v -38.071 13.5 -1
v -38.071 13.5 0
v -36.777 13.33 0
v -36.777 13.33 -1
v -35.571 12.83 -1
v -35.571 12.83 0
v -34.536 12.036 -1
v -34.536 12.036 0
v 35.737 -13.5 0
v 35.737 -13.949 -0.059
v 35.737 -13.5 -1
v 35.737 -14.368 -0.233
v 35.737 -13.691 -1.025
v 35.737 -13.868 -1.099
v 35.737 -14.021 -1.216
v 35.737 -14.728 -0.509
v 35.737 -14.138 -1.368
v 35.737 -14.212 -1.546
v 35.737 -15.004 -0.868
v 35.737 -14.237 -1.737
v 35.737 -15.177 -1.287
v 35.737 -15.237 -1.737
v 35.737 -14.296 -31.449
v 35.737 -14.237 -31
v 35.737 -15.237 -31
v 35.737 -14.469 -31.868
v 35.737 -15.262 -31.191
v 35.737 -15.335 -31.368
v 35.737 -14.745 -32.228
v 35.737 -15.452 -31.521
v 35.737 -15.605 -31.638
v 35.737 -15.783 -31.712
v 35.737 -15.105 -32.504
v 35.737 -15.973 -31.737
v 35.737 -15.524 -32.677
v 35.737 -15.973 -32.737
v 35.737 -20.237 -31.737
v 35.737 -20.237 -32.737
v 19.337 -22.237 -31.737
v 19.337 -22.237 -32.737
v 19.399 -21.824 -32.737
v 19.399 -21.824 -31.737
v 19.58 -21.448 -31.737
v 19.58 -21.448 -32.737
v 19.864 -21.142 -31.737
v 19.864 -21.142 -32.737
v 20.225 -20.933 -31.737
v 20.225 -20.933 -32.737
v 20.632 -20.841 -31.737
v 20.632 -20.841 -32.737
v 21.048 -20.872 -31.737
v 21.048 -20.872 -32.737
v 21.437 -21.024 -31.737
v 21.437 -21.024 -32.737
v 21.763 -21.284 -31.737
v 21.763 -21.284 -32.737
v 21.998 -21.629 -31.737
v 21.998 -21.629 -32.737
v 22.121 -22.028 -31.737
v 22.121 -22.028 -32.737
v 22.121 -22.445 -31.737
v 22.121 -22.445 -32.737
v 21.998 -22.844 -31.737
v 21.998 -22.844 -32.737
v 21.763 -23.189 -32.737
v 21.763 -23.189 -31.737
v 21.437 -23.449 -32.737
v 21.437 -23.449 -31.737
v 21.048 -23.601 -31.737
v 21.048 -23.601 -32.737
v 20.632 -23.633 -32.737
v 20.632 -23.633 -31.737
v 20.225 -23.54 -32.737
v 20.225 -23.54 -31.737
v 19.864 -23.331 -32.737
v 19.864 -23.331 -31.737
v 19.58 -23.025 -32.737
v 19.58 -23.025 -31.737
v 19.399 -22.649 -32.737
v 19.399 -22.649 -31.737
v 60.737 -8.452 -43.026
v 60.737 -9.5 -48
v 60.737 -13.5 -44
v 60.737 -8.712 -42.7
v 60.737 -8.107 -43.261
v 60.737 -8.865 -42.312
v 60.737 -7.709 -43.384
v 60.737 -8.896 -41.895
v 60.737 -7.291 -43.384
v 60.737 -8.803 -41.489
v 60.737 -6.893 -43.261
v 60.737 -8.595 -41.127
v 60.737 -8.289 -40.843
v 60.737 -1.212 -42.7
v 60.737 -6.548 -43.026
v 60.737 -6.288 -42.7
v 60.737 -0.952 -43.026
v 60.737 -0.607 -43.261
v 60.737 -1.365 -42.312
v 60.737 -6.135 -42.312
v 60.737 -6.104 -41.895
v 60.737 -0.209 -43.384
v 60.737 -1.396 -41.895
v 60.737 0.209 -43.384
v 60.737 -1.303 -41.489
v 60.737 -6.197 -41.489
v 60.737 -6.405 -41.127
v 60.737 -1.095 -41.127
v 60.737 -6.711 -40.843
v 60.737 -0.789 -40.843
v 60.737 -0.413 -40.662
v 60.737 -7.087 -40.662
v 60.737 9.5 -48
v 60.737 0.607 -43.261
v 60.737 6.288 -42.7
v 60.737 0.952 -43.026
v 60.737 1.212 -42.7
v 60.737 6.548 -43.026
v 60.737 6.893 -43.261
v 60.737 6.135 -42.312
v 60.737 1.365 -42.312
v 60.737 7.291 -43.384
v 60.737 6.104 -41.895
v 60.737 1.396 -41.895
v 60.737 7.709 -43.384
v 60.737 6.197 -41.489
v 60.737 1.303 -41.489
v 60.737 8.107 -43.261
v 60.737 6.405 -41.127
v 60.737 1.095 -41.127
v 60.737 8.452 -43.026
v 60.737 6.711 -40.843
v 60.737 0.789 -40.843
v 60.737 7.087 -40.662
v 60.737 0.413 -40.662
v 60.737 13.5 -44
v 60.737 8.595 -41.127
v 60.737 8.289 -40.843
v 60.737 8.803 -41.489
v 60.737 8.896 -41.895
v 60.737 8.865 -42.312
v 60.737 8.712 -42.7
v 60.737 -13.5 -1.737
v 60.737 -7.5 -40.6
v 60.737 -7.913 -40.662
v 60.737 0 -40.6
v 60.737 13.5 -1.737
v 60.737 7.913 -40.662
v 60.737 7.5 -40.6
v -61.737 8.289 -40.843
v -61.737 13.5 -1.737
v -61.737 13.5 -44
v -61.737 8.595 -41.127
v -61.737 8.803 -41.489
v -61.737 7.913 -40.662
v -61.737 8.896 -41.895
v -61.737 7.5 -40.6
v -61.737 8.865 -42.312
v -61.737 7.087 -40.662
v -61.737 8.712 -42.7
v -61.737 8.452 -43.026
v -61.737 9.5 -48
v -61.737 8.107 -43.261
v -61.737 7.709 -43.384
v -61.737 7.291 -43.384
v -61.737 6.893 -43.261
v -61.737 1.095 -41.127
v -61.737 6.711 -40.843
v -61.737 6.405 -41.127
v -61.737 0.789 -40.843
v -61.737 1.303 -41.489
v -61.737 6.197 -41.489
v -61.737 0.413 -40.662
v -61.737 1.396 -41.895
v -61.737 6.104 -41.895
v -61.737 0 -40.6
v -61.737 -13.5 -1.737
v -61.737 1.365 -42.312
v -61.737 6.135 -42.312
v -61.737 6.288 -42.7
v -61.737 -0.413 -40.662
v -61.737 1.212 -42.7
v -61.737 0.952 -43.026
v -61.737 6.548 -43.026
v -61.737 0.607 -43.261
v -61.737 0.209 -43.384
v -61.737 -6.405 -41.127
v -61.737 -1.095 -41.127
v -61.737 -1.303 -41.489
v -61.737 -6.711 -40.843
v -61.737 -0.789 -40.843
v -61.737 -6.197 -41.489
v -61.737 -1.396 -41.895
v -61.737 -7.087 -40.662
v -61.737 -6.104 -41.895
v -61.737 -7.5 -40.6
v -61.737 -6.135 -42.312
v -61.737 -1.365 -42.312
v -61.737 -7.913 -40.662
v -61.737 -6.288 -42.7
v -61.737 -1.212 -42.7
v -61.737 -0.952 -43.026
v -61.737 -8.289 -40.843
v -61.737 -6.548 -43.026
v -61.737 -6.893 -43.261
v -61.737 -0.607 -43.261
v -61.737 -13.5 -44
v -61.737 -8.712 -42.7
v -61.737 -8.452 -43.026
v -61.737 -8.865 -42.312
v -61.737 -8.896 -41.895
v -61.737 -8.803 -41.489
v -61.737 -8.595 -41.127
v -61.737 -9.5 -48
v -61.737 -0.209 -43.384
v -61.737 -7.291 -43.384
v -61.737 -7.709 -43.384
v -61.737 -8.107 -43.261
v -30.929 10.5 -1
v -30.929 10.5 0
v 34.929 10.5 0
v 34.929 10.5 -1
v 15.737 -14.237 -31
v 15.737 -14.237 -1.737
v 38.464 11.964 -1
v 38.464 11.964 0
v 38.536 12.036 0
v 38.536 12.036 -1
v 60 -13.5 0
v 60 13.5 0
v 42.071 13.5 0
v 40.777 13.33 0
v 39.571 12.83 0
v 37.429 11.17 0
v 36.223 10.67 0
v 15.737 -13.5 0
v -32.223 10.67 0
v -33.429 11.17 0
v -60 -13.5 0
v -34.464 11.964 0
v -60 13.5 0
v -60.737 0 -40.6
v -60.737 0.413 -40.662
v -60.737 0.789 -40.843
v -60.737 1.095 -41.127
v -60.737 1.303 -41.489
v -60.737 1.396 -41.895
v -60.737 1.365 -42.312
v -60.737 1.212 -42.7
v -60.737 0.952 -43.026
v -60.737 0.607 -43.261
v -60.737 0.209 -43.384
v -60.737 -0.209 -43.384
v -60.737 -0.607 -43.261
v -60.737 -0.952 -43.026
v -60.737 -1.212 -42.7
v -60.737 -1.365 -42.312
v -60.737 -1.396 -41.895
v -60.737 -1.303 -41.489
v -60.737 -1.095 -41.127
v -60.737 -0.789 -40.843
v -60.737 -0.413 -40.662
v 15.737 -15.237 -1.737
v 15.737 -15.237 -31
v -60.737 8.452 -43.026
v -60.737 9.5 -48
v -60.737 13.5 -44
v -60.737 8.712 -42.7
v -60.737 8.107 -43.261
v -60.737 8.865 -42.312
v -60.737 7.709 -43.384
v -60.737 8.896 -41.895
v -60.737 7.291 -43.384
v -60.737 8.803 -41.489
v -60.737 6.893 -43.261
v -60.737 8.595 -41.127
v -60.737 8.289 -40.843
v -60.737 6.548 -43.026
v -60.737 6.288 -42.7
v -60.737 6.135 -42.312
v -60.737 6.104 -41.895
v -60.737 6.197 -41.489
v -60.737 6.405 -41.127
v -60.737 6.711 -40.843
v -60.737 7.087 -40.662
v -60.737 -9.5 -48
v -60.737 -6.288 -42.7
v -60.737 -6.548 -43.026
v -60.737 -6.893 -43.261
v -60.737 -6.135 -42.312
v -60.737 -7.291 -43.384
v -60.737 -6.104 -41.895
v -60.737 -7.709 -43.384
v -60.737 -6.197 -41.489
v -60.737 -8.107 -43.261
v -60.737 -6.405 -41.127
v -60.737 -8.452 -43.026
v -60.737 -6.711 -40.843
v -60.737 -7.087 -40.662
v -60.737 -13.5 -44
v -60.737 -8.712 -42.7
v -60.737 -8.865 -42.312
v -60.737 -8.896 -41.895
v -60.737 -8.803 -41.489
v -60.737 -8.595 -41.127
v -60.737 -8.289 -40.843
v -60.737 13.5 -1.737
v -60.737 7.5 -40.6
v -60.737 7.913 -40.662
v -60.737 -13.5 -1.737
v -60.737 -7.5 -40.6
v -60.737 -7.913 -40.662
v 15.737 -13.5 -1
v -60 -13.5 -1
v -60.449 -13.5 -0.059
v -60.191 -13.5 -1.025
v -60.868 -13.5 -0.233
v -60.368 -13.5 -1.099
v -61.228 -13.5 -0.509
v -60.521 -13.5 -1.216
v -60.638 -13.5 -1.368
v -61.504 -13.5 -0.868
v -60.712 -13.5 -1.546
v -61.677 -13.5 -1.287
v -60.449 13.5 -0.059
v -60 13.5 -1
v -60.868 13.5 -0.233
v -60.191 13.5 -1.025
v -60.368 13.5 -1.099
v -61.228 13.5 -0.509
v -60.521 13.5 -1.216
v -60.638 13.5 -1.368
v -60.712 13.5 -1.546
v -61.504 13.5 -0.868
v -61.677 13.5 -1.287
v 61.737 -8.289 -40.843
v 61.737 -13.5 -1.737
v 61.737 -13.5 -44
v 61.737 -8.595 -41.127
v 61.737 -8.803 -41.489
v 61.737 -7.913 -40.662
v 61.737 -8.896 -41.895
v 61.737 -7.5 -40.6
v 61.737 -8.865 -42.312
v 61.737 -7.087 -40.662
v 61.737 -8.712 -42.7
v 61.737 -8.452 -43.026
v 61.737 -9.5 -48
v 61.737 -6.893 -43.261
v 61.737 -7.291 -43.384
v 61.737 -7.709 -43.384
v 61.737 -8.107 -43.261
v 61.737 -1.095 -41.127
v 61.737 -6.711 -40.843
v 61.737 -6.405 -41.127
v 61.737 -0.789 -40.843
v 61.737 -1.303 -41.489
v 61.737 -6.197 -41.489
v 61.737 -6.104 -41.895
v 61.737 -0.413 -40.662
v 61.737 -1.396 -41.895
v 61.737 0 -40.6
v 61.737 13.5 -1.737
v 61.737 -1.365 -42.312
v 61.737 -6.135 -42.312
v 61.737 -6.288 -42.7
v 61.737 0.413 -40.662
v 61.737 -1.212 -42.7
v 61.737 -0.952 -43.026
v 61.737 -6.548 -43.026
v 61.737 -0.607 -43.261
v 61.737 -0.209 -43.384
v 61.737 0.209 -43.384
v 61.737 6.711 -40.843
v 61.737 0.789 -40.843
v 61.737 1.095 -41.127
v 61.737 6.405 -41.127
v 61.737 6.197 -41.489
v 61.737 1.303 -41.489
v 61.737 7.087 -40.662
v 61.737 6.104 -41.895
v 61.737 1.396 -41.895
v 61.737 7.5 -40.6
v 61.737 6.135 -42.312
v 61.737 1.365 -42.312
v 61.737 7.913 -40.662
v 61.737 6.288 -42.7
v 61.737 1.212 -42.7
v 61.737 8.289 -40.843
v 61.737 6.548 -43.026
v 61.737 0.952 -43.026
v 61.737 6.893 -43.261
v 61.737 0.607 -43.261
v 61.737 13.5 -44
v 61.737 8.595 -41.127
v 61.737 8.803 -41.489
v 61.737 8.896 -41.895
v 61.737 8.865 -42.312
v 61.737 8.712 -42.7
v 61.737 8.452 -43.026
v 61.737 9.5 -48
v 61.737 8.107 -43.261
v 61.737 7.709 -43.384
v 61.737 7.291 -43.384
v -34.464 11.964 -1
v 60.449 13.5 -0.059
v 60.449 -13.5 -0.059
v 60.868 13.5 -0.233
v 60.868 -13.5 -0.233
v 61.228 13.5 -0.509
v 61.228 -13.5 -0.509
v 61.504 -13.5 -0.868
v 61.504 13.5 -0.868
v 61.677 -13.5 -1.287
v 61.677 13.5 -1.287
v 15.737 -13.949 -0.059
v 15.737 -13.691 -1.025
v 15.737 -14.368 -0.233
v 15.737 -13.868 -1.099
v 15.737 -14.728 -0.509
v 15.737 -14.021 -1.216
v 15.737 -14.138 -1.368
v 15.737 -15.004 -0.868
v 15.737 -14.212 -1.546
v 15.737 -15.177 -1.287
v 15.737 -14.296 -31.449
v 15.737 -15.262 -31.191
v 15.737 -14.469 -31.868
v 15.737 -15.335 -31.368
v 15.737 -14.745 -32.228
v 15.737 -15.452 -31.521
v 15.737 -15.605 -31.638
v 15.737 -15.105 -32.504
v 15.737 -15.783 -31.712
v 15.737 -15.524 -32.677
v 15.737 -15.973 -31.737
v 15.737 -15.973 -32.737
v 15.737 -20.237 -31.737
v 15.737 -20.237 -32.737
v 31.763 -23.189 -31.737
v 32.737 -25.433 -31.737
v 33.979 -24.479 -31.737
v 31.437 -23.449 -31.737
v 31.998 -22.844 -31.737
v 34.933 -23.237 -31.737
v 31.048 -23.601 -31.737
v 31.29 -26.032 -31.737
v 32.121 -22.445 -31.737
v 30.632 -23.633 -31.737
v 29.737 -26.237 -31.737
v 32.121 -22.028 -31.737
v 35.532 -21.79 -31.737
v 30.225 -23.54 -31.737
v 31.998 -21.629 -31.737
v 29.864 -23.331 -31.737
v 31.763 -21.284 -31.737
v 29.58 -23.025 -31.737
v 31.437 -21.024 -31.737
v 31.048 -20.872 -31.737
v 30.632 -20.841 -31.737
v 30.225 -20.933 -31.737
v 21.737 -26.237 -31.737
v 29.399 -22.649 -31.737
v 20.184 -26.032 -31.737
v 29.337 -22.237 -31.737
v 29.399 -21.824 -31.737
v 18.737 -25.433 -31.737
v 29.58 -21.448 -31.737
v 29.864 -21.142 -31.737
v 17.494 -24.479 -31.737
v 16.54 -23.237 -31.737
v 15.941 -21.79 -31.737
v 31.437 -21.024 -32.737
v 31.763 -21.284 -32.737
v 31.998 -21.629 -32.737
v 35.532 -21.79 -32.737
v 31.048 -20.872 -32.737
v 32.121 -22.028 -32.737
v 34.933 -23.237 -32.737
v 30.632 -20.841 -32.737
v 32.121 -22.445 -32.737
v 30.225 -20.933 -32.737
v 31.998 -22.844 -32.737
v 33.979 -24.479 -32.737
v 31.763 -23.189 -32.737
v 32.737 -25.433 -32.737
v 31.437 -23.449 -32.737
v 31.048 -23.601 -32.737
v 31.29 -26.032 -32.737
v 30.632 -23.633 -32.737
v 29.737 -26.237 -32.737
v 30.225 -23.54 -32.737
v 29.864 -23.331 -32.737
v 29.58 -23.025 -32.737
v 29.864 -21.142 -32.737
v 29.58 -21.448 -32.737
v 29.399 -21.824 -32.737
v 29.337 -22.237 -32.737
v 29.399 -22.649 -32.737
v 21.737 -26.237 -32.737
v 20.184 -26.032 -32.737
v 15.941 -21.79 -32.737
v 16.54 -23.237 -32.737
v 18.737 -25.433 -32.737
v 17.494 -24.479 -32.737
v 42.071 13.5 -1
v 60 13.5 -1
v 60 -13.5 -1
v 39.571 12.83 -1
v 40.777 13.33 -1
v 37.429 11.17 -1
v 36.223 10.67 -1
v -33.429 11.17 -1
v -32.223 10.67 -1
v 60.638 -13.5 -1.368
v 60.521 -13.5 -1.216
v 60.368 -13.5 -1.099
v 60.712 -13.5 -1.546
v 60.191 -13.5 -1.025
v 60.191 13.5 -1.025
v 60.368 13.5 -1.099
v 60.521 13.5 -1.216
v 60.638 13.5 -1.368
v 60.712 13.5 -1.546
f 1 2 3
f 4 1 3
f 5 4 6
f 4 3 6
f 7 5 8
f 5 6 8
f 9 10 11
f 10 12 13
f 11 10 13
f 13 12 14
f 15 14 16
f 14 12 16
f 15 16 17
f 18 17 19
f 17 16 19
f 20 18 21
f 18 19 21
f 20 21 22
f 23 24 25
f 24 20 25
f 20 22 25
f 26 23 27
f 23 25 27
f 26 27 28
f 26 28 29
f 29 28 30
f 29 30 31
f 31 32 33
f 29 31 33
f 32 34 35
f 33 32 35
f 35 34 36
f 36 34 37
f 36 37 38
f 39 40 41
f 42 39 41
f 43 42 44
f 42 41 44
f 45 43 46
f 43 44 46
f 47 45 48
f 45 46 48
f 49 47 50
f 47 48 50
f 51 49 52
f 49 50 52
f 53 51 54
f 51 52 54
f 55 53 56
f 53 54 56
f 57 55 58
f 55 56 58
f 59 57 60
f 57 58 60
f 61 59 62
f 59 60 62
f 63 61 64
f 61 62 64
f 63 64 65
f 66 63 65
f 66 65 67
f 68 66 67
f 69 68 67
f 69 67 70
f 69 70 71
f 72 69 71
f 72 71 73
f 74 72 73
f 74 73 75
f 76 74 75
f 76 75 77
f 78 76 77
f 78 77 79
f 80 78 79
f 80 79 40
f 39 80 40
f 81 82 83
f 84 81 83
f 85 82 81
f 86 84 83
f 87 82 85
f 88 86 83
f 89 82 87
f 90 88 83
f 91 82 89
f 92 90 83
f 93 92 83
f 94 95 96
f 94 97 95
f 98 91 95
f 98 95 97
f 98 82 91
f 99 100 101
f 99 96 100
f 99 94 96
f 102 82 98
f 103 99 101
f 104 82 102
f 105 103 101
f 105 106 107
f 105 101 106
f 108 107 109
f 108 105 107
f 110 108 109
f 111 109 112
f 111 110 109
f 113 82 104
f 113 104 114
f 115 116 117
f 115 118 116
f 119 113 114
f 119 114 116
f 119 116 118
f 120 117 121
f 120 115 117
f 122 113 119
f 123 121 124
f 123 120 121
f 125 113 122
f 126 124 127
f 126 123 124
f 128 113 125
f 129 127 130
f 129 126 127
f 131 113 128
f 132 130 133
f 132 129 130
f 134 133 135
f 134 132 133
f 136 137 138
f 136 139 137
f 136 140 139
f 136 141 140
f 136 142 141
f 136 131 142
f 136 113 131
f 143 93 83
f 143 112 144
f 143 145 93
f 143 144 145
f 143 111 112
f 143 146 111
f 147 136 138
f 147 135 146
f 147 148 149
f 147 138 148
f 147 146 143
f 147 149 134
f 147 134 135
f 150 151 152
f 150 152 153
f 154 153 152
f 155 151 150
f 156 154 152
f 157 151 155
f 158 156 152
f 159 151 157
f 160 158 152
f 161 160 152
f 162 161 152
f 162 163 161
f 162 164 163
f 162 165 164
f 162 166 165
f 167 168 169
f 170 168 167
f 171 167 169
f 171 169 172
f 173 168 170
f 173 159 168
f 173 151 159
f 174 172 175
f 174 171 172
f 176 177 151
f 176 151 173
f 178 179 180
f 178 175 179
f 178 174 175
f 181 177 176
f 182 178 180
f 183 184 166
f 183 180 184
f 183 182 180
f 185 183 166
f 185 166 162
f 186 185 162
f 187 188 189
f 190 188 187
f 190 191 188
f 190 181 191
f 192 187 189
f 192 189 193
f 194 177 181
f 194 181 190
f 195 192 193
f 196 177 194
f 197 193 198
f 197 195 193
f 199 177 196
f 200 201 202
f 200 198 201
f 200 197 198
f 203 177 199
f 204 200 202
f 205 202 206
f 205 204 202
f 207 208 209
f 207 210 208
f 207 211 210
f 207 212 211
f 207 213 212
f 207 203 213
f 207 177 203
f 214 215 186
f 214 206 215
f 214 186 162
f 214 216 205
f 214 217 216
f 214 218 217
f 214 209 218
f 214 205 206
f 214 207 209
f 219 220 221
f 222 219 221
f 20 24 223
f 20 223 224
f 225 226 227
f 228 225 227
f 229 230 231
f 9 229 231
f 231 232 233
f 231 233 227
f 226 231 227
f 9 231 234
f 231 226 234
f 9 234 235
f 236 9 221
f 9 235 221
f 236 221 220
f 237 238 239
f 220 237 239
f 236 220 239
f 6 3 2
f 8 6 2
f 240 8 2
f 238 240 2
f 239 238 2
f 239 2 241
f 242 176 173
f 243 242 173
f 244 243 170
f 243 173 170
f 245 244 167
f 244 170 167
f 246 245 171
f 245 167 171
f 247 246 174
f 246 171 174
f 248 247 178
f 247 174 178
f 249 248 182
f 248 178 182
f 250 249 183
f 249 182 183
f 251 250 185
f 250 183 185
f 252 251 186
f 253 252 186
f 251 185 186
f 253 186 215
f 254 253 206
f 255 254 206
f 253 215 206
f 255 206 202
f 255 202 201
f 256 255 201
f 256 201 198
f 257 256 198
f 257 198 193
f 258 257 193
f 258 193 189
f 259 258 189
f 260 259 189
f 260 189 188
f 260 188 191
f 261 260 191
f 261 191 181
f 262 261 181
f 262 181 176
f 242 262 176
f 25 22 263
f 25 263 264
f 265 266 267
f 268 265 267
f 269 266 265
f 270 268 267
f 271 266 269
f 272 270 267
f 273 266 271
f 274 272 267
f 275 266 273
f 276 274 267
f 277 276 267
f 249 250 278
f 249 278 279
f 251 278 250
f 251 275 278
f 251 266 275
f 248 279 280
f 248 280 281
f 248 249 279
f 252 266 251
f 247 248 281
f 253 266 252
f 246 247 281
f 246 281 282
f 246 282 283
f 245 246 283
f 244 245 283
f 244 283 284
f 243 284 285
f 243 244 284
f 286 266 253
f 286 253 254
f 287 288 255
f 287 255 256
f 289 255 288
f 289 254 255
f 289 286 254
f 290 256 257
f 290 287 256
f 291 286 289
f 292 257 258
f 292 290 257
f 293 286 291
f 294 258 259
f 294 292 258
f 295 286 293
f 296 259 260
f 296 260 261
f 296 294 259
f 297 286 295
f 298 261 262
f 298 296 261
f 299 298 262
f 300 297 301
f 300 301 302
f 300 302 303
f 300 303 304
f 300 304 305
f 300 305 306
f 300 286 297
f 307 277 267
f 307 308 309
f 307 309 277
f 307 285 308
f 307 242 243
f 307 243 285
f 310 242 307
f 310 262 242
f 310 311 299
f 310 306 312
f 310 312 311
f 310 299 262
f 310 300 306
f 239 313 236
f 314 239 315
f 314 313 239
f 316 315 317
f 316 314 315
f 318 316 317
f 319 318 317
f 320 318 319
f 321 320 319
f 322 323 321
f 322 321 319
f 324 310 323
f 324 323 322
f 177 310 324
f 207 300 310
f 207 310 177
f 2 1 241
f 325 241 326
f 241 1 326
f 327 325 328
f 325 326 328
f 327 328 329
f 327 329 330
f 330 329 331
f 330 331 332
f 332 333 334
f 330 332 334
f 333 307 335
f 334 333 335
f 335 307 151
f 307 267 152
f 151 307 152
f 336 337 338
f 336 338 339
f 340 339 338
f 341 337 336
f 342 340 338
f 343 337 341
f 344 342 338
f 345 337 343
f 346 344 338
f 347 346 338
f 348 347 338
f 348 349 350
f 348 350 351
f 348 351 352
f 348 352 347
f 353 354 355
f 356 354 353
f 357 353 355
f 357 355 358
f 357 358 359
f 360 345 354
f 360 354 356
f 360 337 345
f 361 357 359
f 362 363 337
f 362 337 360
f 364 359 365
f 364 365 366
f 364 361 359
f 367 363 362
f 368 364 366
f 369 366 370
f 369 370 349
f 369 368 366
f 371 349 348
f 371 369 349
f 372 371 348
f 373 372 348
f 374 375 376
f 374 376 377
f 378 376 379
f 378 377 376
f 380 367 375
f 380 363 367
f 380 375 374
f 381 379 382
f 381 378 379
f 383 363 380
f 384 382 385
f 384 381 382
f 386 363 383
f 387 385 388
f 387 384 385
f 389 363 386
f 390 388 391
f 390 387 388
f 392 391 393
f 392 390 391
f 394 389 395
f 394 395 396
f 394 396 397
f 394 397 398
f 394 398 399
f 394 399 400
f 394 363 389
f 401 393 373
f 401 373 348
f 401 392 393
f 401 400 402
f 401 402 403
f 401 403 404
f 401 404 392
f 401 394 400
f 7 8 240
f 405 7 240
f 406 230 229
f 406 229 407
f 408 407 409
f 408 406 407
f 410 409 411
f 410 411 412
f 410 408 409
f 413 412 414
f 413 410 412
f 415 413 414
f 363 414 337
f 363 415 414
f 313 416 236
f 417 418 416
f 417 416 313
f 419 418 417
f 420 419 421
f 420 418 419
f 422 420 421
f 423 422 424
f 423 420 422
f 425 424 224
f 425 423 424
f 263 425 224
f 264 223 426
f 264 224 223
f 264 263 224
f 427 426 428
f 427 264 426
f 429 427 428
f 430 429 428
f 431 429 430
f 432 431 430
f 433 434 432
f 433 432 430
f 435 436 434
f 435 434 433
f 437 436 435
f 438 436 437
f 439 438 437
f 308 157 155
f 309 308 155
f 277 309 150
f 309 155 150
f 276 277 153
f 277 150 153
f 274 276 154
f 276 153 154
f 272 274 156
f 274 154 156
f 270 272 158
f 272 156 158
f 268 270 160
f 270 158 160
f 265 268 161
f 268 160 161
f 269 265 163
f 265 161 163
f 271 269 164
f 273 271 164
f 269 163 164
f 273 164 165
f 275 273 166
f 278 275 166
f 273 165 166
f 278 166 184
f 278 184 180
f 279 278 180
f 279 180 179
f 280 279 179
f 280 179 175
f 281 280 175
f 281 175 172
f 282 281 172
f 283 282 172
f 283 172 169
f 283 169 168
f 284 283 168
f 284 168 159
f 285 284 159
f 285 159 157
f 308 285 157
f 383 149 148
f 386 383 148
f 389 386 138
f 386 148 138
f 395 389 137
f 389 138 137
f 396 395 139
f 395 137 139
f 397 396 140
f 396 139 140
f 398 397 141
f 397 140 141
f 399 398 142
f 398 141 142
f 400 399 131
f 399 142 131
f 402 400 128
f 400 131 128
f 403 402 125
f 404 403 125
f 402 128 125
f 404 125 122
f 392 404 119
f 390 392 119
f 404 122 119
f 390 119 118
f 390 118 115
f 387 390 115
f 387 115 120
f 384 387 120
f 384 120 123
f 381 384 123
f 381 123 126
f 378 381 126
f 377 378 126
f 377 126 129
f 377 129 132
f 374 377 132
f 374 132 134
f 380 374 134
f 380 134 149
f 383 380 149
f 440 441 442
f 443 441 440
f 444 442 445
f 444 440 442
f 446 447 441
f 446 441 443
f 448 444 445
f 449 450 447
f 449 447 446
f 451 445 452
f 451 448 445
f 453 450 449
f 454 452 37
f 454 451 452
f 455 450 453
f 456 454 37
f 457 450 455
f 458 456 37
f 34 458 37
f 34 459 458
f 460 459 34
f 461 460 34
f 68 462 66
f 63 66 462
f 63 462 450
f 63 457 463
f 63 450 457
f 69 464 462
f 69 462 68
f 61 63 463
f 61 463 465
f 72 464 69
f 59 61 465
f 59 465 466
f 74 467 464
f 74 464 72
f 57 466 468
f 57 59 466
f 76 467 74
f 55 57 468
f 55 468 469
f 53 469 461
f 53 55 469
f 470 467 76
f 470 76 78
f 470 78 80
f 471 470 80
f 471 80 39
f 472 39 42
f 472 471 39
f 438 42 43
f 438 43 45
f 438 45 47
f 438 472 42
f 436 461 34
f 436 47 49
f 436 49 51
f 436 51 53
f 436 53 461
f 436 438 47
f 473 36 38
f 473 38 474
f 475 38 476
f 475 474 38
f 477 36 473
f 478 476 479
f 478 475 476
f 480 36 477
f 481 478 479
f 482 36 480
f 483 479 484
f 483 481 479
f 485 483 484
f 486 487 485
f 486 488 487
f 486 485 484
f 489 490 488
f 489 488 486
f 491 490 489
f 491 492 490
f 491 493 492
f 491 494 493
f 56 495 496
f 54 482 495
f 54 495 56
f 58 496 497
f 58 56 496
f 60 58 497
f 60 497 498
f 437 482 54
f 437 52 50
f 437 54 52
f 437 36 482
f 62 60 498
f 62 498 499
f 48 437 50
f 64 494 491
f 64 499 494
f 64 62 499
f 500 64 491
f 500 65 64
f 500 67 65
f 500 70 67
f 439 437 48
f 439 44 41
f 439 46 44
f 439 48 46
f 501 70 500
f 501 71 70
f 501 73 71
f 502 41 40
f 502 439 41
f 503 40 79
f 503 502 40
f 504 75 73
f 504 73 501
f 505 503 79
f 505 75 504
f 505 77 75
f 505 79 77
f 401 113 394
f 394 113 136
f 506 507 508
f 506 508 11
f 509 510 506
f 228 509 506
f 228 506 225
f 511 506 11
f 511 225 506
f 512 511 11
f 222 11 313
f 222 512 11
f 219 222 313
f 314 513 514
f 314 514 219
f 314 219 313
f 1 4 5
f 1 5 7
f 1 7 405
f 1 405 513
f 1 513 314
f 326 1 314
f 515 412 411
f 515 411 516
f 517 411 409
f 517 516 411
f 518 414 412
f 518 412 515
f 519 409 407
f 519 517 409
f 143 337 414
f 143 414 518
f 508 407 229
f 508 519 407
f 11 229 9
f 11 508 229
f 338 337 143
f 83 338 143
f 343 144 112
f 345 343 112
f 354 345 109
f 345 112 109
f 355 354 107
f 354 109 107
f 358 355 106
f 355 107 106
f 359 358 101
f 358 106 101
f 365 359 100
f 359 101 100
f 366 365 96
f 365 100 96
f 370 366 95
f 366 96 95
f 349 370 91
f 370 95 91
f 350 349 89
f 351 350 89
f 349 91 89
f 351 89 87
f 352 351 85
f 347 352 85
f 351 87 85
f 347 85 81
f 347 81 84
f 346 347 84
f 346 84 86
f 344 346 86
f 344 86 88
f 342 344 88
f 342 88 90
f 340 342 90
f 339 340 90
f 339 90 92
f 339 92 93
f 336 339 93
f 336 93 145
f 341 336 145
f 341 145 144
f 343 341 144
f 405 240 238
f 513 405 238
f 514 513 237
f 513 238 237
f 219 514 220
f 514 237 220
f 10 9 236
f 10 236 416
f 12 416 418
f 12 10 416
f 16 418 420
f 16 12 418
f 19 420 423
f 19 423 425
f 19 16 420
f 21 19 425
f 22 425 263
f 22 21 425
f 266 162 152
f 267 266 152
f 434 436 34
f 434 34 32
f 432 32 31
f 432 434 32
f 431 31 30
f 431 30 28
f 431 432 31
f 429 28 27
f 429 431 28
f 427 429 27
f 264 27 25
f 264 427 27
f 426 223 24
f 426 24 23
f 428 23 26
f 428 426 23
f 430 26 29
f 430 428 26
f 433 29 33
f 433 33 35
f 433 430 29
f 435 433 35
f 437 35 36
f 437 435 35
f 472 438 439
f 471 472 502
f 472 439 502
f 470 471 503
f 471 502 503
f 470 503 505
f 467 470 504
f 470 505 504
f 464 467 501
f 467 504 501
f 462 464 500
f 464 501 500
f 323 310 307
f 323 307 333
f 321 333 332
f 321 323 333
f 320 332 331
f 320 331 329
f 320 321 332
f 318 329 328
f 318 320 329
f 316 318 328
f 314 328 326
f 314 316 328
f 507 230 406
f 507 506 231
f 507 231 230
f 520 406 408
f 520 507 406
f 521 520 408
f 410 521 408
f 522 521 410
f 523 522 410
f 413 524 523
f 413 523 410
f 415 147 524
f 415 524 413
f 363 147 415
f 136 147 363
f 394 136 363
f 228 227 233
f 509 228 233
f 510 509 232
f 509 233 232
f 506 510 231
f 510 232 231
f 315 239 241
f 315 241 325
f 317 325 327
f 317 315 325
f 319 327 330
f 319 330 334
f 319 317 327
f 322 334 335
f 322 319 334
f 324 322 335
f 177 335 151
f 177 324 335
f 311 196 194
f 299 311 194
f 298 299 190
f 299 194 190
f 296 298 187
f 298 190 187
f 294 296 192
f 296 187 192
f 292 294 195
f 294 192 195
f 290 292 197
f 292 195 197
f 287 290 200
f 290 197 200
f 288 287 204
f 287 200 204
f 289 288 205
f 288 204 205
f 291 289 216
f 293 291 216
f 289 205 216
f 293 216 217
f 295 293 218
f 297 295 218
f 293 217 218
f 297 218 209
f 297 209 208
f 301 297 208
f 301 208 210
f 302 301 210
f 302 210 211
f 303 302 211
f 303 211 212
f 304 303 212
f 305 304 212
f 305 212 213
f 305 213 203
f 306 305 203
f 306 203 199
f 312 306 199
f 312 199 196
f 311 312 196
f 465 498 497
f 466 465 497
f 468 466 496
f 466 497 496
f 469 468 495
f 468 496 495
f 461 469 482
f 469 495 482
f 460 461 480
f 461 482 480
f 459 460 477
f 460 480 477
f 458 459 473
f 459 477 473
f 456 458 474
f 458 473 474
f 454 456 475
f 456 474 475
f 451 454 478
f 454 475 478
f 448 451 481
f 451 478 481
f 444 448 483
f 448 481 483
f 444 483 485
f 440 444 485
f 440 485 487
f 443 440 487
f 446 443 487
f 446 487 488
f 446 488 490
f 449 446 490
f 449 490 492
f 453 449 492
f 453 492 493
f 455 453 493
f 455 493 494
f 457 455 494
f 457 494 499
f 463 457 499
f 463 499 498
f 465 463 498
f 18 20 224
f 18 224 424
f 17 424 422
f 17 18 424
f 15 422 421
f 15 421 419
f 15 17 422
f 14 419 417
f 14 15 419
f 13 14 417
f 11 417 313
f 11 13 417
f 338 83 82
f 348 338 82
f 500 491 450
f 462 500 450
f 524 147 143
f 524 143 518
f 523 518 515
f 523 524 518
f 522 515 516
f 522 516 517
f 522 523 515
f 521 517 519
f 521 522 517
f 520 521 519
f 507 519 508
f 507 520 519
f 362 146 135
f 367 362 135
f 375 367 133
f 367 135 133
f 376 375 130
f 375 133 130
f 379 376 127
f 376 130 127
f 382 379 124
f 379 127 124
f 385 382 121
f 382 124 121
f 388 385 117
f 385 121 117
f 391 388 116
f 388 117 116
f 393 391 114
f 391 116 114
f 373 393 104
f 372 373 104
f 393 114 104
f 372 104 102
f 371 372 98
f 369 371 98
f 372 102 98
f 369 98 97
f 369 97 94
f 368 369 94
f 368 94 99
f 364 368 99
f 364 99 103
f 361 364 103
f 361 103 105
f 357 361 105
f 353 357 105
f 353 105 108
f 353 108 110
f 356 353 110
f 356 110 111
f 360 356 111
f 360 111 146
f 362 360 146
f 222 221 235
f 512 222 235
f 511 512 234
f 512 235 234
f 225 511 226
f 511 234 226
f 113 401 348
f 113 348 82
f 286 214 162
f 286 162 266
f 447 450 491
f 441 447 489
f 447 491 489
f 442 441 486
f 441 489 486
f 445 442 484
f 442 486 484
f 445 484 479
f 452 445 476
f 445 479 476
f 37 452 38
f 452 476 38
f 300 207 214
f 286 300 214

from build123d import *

# Parameters (mm, degrees)
BASE_FLANGE1_DEPTH = 1
EDGE_FLANGE1_DEPTH = 27
EDGE_FLANGE2_DEPTH = 27
EDGE_FLANGE3_DEPTH = 20
EDGE_FLANGE4_DEPTH = 20
SKETCH18_R         = 1.4
CUT_EXTRUDE1_DEPTH = 136.048103644
SKETCH19_R         = 1.4
CUT_EXTRUDE2_DEPTH = 75.642159258


# Sheet-metal steps are written as plain solids
with BuildPart() as part:
    # Sketch1 → Base-Flange1 (new body)
    with BuildSketch(Plane.XY):
        with BuildLine():
            Line((-30.928932188, 10.5), (34.928932188, 10.5))
            ThreePointArc((34.928932188, 10.5), (36.84234935, 10.880602337), (38.464466094, 11.964466094))
            Line((38.464466094, 11.964466094), (38.535533906, 12.035533906))
            ThreePointArc((38.535533906, 12.035533906), (40.15765065, 13.119397663), (42.071067812, 13.5))
            Line((42.071067812, 13.5), (60, 13.5))
            Line((60, 13.5), (60, -13.5))
            Line((60, -13.5), (-60, -13.5))
            Line((-60, -13.5), (-60, 13.5))
            Line((-60, 13.5), (-38.071067812, 13.5))
            ThreePointArc((-38.071067812, 13.5), (-36.15765065, 13.119397663), (-34.535533906, 12.035533906))
            Line((-34.535533906, 12.035533906), (-34.464466094, 11.964466094))
            ThreePointArc((-34.464466094, 11.964466094), (-32.84234935, 10.880602337), (-30.928932188, 10.5))
        make_face()
    extrude(amount=-BASE_FLANGE1_DEPTH)

    # Edge-Flange1 section (across the edge) → Edge-Flange1 (add)
    with BuildSketch(Plane(origin=(60.7366, 13.5, -1), x_dir=(-1, 0, 0), z_dir=(0, -1, 0))):
        with BuildLine():
            Line((-1, 0.7366), (-1, 47))
            Line((-1, 47), (0, 47))
            Line((0, 47), (0, 0.7366))
            ThreePointArc((0, 0.7366), (0.215745145, 0.215745145), (0.7366, 0))
            Line((0.7366, 0), (0.7366, -1))
            ThreePointArc((0.7366, -1), (-0.491361636, -0.491361636), (-1, 0.7366))
        make_face()
    extrude(amount=EDGE_FLANGE1_DEPTH)

    # Edge-Flange2 section (across the edge) → Edge-Flange2 (add)
    with BuildSketch(Plane(origin=(-60.7366, -13.5, -1), x_dir=(1, 0, 0), z_dir=(0, 1, 0))):
        with BuildLine():
            Line((-1, 0.7366), (-1, 47))
            Line((-1, 47), (0, 47))
            Line((0, 47), (0, 0.7366))
            ThreePointArc((0, 0.7366), (0.215745145, 0.215745145), (0.7366, 0))
            Line((0.7366, 0), (0.7366, -1))
            ThreePointArc((0.7366, -1), (-0.491361636, -0.491361636), (-1, 0.7366))
        make_face()
    extrude(amount=EDGE_FLANGE2_DEPTH)

    # Edge-Flange3 section (across the edge) → Edge-Flange3 (add)
    with BuildSketch(Plane(origin=(35.7366, -14.2366, -1), x_dir=(0, 1, 0), z_dir=(-1, 0, 0))):
        with BuildLine():
            Line((-1, 0.7366), (-1, 30))
            Line((-1, 30), (0, 30))
            Line((0, 30), (0, 0.7366))
            ThreePointArc((0, 0.7366), (0.215745145, 0.215745145), (0.7366, 0))
            Line((0.7366, 0), (0.7366, -1))
            ThreePointArc((0.7366, -1), (-0.491361636, -0.491361636), (-1, 0.7366))
        make_face()
    extrude(amount=EDGE_FLANGE3_DEPTH)

    # Edge-Flange4 section (across the edge) → Edge-Flange4 (add)
    with BuildSketch(Plane(origin=(15.7366, -15.2366, -31.7366), x_dir=(0, 0, 1), z_dir=(1, 0, 0))):
        with BuildLine():
            Line((-1, 0.7366), (-1, 11))
            Line((-1, 11), (0, 11))
            Line((0, 11), (0, 0.7366))
            ThreePointArc((0, 0.7366), (0.215745145, 0.215745145), (0.7366, 0))
            Line((0.7366, 0), (0.7366, -1))
            ThreePointArc((0.7366, -1), (-0.491361636, -0.491361636), (-1, 0.7366))
        make_face()
    extrude(amount=EDGE_FLANGE4_DEPTH)

    # Sketch18 → Cut-Extrude1 (cut, through all)
    with BuildSketch(Plane.ZY.offset(61.7366)):
        Polygon((-48, 9.5), (-44, 13.5), (-48, 13.5), align=None)
        Polygon((-48, -13.5), (-44, -13.5), (-48, -9.5), align=None)
        with Locations((-42, 7.5)):
            Circle(SKETCH18_R)
        with Locations((-42, 0)):
            Circle(SKETCH18_R)
        with Locations((-42, -7.5)):
            Circle(SKETCH18_R)
    extrude(amount=-CUT_EXTRUDE1_DEPTH, mode=Mode.SUBTRACT)

    # Sketch19 → Cut-Extrude2 (cut, through all)
    with BuildSketch(Plane(origin=(0, 0, -32.7366), x_dir=(-1, 0, 0), z_dir=(0, 0, -1))):
        with BuildLine():
            ThreePointArc((-15.7366, -20.2366), (-17.493959313, -24.479240687), (-21.7366, -26.2366))
            Line((-21.7366, -26.2366), (-15.7366, -26.2366))
            Line((-15.7366, -26.2366), (-15.7366, -20.2366))
        make_face()
        with BuildLine():
            ThreePointArc((-29.7366, -26.2366), (-33.979240687, -24.479240687), (-35.7366, -20.2366))
            Line((-35.7366, -20.2366), (-35.7366, -26.2366))
            Line((-35.7366, -26.2366), (-29.7366, -26.2366))
        make_face()
        with Locations((-30.7366, -22.2366)):
            Circle(SKETCH19_R)
        with Locations((-20.7366, -22.2366)):
            Circle(SKETCH19_R)
    extrude(amount=-CUT_EXTRUDE2_DEPTH, mode=Mode.SUBTRACT)


solid = part.part
